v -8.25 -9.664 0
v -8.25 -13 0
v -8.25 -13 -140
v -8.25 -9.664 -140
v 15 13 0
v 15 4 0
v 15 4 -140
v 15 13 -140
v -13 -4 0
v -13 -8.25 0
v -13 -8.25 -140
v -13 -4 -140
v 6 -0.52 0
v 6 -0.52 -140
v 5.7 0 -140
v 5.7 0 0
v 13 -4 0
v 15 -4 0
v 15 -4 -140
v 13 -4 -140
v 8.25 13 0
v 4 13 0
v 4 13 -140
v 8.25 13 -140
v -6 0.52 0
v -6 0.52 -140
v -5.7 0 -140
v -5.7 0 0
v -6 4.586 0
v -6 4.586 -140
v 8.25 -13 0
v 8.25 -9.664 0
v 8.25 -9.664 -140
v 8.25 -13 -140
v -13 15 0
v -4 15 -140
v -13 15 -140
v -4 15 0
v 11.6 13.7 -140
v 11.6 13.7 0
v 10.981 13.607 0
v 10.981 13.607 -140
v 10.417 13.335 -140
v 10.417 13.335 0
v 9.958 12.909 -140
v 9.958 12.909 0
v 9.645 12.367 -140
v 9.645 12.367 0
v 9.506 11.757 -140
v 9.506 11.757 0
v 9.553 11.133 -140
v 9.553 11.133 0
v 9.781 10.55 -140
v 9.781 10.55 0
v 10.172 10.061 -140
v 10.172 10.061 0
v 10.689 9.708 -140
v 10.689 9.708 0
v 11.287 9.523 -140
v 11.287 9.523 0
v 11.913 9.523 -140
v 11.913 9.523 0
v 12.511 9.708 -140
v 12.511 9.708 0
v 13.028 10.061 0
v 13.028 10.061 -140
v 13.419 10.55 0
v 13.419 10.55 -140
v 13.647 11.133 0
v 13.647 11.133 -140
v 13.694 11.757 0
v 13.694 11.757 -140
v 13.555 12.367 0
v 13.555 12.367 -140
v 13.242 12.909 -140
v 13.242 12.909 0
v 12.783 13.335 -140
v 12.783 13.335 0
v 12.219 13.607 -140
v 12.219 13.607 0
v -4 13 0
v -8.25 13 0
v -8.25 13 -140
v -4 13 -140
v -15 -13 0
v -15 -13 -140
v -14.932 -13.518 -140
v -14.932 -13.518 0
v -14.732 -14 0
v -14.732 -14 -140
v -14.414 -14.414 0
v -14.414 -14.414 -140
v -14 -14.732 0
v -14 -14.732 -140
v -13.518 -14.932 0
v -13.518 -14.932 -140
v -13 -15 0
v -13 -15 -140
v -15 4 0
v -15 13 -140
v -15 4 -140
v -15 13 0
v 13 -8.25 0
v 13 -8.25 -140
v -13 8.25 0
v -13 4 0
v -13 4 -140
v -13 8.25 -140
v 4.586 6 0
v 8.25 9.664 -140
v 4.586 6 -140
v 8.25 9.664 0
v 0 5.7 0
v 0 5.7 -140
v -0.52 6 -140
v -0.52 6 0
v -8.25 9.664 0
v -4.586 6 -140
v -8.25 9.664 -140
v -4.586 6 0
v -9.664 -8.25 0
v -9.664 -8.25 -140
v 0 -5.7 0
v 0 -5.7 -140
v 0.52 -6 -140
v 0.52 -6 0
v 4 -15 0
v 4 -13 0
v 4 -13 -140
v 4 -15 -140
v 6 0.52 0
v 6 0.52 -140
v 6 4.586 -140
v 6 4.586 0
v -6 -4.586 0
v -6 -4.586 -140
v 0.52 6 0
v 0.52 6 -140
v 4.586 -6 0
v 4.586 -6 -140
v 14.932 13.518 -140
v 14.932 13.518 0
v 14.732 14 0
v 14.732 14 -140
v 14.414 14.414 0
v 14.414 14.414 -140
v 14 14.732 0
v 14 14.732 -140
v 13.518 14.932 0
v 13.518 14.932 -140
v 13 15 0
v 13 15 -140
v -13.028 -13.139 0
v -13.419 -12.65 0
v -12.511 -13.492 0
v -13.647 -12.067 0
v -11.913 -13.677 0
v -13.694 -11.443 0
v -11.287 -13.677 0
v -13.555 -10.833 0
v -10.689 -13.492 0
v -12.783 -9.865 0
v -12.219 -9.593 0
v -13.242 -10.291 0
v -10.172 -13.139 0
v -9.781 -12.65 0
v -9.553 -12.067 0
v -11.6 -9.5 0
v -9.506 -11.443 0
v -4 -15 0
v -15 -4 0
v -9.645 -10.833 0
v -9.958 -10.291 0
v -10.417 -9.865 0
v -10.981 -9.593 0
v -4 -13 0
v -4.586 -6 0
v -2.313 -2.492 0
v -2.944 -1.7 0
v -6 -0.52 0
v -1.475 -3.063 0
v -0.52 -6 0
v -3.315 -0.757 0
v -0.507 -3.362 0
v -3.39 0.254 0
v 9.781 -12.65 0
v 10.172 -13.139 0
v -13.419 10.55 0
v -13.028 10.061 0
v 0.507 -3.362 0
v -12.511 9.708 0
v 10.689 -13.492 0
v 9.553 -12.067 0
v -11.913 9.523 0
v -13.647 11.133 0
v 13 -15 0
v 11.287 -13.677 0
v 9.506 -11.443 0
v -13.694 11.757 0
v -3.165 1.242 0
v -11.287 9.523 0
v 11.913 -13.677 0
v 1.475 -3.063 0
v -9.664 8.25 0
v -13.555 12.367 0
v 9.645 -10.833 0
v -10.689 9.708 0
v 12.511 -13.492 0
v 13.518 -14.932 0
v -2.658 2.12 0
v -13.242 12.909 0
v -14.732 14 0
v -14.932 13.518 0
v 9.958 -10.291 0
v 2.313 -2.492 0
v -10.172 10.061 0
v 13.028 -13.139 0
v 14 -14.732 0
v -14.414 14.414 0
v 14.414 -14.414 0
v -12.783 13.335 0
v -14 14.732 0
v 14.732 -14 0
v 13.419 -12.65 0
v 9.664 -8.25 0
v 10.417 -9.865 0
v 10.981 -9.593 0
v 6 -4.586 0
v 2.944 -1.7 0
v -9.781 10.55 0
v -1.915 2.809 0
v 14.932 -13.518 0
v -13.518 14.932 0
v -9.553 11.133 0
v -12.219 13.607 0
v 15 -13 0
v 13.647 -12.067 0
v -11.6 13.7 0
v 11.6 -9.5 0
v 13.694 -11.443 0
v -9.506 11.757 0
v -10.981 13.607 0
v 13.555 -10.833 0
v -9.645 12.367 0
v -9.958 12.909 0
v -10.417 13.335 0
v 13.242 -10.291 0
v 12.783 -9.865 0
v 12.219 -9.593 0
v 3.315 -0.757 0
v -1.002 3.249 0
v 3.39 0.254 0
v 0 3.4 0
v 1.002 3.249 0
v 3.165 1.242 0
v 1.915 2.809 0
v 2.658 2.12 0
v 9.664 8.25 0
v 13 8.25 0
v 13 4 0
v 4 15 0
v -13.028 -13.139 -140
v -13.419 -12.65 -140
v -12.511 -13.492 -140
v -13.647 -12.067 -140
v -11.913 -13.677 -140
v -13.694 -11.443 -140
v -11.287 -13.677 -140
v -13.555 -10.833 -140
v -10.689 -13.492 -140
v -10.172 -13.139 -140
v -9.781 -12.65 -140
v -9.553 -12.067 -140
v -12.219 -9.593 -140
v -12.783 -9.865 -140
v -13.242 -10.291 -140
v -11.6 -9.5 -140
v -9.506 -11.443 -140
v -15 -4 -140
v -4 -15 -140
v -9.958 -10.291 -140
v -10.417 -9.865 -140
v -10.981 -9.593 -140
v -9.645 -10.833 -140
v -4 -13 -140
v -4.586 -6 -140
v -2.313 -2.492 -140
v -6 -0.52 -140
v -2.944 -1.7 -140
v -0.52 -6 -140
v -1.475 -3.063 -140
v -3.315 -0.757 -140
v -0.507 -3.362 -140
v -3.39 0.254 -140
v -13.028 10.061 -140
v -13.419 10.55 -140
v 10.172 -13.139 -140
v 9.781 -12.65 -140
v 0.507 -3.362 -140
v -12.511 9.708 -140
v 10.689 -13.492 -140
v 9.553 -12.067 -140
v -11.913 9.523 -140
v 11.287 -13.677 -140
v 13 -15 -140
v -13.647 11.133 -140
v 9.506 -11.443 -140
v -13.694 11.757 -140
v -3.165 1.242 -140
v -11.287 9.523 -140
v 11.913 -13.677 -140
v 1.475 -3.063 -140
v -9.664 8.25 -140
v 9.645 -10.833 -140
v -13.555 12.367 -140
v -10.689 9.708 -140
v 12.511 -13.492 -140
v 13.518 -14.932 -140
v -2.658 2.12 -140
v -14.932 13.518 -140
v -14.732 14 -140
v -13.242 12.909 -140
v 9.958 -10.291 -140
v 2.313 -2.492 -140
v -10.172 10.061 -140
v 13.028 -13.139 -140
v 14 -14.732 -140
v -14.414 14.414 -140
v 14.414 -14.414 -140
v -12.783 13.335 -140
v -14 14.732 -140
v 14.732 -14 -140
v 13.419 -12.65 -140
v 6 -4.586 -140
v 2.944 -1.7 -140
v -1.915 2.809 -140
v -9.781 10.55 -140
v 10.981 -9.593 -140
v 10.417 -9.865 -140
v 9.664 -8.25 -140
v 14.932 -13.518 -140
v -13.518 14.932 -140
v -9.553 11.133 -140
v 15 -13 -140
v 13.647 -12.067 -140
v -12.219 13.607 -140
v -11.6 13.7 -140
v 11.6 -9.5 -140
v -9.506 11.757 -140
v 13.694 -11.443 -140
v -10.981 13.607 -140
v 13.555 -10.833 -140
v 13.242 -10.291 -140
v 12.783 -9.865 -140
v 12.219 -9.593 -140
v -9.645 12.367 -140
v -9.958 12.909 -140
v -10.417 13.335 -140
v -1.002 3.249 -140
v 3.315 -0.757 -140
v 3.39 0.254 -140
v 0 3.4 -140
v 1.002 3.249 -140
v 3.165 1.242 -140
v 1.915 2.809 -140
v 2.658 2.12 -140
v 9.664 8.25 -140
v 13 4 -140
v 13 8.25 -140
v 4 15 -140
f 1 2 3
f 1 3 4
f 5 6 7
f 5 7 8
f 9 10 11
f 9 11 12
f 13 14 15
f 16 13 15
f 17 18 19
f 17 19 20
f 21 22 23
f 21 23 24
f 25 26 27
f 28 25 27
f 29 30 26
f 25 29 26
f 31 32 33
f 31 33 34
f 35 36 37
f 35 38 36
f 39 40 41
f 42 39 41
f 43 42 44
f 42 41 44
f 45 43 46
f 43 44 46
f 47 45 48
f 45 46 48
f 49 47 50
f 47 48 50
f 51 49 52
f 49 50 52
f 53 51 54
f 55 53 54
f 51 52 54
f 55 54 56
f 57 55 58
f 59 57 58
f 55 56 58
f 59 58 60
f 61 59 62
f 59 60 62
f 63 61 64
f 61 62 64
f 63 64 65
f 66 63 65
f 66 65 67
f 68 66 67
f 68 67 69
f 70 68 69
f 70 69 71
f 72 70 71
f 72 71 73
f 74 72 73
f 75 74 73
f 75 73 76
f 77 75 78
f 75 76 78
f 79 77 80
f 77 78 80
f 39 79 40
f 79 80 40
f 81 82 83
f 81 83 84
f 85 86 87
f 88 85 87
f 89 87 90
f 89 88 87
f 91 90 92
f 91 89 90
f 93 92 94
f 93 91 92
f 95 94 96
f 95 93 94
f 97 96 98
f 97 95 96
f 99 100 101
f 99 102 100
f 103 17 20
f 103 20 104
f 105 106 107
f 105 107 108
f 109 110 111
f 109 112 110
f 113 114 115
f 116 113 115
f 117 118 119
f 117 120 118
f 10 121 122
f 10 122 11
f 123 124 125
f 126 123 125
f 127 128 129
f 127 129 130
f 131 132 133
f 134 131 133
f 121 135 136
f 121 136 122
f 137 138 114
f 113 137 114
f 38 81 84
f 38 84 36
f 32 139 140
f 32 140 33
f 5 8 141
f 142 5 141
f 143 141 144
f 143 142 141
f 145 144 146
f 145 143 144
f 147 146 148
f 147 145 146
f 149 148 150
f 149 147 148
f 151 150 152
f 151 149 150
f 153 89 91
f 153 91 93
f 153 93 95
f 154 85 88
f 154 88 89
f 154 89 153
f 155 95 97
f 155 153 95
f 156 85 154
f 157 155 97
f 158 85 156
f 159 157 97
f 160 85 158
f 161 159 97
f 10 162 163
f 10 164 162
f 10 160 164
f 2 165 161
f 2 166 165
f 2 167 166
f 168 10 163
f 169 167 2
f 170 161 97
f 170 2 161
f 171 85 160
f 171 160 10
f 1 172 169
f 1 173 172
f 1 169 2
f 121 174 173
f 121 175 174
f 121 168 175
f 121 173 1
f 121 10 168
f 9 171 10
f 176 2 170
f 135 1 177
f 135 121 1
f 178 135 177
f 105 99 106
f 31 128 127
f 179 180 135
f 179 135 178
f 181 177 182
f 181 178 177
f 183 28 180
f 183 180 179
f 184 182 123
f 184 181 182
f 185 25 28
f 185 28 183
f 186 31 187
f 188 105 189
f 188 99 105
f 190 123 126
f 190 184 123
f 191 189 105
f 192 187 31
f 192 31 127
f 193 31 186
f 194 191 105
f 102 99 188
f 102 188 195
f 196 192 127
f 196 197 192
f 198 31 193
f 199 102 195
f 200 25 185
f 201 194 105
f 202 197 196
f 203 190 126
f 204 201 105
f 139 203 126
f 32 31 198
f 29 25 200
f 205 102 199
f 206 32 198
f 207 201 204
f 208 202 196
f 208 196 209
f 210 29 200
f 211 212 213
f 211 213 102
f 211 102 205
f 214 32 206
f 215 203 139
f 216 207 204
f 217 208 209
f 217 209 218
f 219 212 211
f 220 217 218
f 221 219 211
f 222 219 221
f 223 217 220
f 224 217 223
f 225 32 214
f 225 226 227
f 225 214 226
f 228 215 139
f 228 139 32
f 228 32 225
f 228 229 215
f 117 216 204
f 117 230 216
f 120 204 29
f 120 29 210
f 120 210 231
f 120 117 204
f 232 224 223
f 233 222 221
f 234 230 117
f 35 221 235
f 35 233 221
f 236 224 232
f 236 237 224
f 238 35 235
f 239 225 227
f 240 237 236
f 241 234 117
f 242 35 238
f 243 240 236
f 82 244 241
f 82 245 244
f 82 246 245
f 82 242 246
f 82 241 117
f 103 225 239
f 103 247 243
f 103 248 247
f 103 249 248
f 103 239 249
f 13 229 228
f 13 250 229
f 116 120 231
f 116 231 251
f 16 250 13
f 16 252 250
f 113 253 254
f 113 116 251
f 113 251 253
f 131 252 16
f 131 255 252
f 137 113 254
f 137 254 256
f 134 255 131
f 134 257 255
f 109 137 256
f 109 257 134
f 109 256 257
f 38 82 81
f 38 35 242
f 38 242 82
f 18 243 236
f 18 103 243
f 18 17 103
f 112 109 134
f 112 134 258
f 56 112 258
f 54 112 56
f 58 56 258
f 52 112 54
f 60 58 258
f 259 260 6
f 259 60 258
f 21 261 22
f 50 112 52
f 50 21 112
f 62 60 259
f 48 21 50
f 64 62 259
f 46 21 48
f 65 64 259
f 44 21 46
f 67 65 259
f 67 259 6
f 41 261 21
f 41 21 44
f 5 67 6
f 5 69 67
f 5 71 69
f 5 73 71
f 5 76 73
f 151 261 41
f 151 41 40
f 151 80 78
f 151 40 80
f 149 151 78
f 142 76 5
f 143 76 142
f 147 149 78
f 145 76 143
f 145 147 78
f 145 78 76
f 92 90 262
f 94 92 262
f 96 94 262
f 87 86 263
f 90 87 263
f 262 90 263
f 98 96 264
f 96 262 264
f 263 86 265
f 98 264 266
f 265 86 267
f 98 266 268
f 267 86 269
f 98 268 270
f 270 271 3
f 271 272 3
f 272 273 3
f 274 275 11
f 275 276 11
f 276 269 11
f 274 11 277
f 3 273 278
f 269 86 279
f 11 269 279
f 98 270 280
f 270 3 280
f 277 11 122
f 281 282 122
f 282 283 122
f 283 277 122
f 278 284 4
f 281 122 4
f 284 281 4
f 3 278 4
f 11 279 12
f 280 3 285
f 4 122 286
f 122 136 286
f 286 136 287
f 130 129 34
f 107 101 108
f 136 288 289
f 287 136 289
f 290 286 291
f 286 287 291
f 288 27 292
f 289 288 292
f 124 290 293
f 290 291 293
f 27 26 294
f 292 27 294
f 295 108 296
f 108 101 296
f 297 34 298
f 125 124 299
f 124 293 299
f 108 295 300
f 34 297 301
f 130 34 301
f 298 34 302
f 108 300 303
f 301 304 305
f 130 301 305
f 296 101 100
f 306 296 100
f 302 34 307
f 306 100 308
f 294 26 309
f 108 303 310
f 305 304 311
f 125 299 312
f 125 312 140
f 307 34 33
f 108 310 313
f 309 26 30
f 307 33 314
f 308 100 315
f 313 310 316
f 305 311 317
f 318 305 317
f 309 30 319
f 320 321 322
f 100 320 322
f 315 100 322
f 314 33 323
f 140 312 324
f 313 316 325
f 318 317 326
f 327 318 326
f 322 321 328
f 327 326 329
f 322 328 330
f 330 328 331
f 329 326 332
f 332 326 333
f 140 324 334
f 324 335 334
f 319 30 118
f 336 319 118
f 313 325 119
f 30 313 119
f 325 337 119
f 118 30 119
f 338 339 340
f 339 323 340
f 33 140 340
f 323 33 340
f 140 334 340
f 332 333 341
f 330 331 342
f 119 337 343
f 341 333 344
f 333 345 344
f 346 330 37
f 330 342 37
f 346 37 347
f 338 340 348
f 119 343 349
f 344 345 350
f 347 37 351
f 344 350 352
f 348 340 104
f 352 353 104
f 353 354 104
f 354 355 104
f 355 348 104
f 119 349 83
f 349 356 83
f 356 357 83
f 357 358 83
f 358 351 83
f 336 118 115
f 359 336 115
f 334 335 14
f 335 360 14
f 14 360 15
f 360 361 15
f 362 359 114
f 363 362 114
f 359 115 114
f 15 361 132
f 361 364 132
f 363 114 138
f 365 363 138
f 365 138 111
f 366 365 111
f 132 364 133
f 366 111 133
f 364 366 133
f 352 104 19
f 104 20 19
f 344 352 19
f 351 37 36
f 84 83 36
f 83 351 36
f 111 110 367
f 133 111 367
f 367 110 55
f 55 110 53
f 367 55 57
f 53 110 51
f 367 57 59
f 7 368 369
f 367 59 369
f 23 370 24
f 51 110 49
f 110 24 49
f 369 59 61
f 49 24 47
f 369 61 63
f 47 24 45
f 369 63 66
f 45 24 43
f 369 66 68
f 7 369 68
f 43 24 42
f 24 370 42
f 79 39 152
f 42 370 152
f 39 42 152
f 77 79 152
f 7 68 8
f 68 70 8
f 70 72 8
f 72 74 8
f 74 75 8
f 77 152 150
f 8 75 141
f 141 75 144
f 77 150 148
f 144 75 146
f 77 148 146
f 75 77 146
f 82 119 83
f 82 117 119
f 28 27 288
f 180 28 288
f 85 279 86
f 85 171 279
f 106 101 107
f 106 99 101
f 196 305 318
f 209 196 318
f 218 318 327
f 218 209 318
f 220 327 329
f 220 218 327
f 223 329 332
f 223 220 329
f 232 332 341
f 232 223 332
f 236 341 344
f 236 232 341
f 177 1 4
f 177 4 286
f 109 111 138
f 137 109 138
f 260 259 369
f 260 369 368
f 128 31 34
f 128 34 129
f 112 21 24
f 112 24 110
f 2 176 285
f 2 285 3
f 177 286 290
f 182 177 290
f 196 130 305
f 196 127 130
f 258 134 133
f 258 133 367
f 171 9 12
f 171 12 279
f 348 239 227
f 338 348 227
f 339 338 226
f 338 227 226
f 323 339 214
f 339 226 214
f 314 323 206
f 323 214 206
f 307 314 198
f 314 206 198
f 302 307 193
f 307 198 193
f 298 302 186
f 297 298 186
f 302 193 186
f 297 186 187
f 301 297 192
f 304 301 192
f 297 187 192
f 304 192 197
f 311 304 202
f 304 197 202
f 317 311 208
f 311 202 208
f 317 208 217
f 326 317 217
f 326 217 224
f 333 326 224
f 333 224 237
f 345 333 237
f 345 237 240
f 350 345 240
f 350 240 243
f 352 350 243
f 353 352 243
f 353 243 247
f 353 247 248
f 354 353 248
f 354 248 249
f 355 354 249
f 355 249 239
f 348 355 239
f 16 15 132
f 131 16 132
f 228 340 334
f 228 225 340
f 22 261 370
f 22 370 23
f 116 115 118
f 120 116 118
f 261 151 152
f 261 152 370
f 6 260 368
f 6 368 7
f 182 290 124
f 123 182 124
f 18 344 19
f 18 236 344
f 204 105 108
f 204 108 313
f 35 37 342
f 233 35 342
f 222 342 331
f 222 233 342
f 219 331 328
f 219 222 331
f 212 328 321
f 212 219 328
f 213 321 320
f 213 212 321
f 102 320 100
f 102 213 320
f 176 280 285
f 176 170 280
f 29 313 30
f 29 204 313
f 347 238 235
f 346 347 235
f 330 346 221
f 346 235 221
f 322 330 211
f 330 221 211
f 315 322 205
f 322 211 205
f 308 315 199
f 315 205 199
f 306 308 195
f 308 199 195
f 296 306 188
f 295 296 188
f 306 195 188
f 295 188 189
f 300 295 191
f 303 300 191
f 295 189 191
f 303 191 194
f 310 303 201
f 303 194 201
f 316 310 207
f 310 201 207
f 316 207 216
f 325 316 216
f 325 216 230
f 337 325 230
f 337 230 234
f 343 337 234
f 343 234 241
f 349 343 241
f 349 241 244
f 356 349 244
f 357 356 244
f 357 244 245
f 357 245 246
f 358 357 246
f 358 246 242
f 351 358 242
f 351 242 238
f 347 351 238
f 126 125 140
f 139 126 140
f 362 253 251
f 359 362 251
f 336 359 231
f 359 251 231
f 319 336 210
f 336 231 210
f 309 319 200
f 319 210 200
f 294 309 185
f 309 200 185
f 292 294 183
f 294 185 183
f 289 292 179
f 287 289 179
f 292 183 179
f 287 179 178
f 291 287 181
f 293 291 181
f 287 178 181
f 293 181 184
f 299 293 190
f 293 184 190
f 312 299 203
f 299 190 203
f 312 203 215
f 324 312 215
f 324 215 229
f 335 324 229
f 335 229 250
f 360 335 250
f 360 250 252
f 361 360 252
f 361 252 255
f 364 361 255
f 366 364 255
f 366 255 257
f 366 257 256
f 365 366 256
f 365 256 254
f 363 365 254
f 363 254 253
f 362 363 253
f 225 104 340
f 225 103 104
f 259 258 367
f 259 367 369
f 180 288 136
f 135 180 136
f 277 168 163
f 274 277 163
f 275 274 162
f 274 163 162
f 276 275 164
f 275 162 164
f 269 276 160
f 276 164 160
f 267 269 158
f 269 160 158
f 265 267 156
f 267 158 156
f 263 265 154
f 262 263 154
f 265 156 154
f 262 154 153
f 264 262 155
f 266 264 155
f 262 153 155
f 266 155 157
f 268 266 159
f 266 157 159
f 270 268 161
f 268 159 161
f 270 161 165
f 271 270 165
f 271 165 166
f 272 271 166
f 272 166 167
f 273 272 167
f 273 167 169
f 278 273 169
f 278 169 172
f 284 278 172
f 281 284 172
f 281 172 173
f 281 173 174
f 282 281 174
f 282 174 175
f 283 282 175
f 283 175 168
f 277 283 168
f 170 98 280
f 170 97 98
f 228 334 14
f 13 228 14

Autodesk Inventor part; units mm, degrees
sketch "Sketch_1" plane through (0, 0, 0) normal (0, 0, 1) x (1, 0, 0)
  line L0 (-15, -4) -> (-15, -13)
  arc A0 (-15, -13) -> (-13, -15) centre (-13, -13) ccw
  line L1 (-13, -15) -> (-4, -15)
  line L2 (-4, -15) -> (-4, -13)
  line L3 (-4, -13) -> (-8.25, -13)
  line L4 (-8.25, -13) -> (-8.25, -9.6642)
  line L5 (-8.25, -9.6642) -> (-4.5858, -6)
  line L6 (-4.5858, -6) -> (-0.5196, -6)
  line L7 (-0.5196, -6) -> (0, -5.7)
  line L8 (0, -5.7) -> (0.5196, -6)
  line L9 (0.5196, -6) -> (4.5858, -6)
  line L10 (4.5858, -6) -> (8.25, -9.6642)
  line L11 (8.25, -9.6642) -> (8.25, -13)
  line L12 (8.25, -13) -> (4, -13)
  line L13 (4, -13) -> (4, -15)
  line L14 (4, -15) -> (13, -15)
  arc A1 (13, -15) -> (15, -13) centre (13, -13) ccw
  line L15 (15, -13) -> (15, -4)
  line L16 (15, -4) -> (13, -4)
  line L17 (13, -4) -> (13, -8.25)
  line L18 (13, -8.25) -> (9.6642, -8.25)
  line L19 (9.6642, -8.25) -> (6, -4.5858)
  line L20 (6, -4.5858) -> (6, -0.5196)
  line L21 (6, -0.5196) -> (5.7, 0)
  line L22 (5.7, 0) -> (6, 0.5196)
  line L23 (6, 0.5196) -> (6, 4.5858)
  line L24 (6, 4.5858) -> (9.6642, 8.25)
  line L25 (9.6642, 8.25) -> (13, 8.25)
  line L26 (13, 8.25) -> (13, 4)
  line L27 (13, 4) -> (15, 4)
  line L28 (15, 4) -> (15, 13)
  arc A2 (15, 13) -> (13, 15) centre (13, 13) ccw
  line L29 (13, 15) -> (4, 15)
  line L30 (4, 15) -> (4, 13)
  line L31 (4, 13) -> (8.25, 13)
  line L32 (8.25, 13) -> (8.25, 9.6642)
  line L33 (8.25, 9.6642) -> (4.5858, 6)
  line L34 (4.5858, 6) -> (0.5196, 6)
  line L35 (0.5196, 6) -> (0, 5.7)
  line L36 (0, 5.7) -> (-0.5196, 6)
  line L37 (-0.5196, 6) -> (-4.5858, 6)
  line L38 (-4.5858, 6) -> (-8.25, 9.6642)
  line L39 (-8.25, 9.6642) -> (-8.25, 13)
  line L40 (-8.25, 13) -> (-4, 13)
  line L41 (-4, 13) -> (-4, 15)
  line L42 (-4, 15) -> (-13, 15)
  arc A3 (-13, 15) -> (-15, 13) centre (-13, 13) ccw
  line L43 (-15, 13) -> (-15, 4)
  line L44 (-15, 4) -> (-13, 4)
  line L45 (-13, 4) -> (-13, 8.25)
  line L46 (-13, 8.25) -> (-9.6642, 8.25)
  line L47 (-9.6642, 8.25) -> (-6, 4.5858)
  line L48 (-6, 4.5858) -> (-6, 0.5196)
  line L49 (-6, 0.5196) -> (-5.7, 0)
  line L50 (-5.7, 0) -> (-6, -0.5196)
  line L51 (-6, -0.5196) -> (-6, -4.5858)
  line L52 (-6, -4.5858) -> (-9.6642, -8.25)
  line L53 (-9.6642, -8.25) -> (-13, -8.25)
  line L54 (-13, -8.25) -> (-13, -4)
  line L55 (-13, -4) -> (-15, -4)
extrude "Extrusion1" add sketch "Sketch_1" against normal blind 140
sketch "Sketch2" plane through (0, 0, -140) normal (0, 0, -1) x (-1, 0, 0)
  point P0 (0, 0)
hole "Hole1" at (0, 0, -140) direction (0, 0, 1) diameter 6.8 depth 140
sketch "Sketch3" plane through (0, 0, -140) normal (0, 0, -1) x (-1, 0, 0)
  point P0 (-11.6, 11.6)
hole "Hole2" at (11.6, 11.6, -140) direction (0, 0, 1) diameter 4.2 depth 140
pattern_linear "Rectangular Pattern1" count 2 spacing 23.2 along (-1, 0, 0) count 2 spacing 23.2 along (0, -1, 0) of "Hole2"
ref_plane "C1_XY" through (0, 0, 0) normal (0, 0, 1) x (1, 0, 0)
ref_plane "C1_YZ" through (0, 0, 0) normal (1, 0, 0) x (0, 1, 0)
ref_plane "C1_ZX" through (0, 0, 0) normal (0, 1, 0) x (0, 0, 1)
ref_plane "to_frame_cap1_XY" through (0, 0, 0) normal (0, 0, 1) x (1, 0, 0)
ref_plane "to_frame_cap1_YZ" through (0, 0, 0) normal (1, 0, 0) x (0, 1, 0)
ref_plane "to_frame_cap1_ZX" through (0, 0, 0) normal (0, 1, 0) x (0, 0, 1)
ref_plane "to_frame_cap2_XY" through (0, 0, -140) normal (0, 0, -1) x (1, 0, 0)
ref_plane "to_frame_cap2_YZ" through (0, 0, -140) normal (1, 0, 0) x (0, -1, 0)
ref_plane "to_frame_cap2_ZX" through (0, 0, -140) normal (0, -1, 0) x (0, 0, -1)
properties part number "HFS6-3030-140"
